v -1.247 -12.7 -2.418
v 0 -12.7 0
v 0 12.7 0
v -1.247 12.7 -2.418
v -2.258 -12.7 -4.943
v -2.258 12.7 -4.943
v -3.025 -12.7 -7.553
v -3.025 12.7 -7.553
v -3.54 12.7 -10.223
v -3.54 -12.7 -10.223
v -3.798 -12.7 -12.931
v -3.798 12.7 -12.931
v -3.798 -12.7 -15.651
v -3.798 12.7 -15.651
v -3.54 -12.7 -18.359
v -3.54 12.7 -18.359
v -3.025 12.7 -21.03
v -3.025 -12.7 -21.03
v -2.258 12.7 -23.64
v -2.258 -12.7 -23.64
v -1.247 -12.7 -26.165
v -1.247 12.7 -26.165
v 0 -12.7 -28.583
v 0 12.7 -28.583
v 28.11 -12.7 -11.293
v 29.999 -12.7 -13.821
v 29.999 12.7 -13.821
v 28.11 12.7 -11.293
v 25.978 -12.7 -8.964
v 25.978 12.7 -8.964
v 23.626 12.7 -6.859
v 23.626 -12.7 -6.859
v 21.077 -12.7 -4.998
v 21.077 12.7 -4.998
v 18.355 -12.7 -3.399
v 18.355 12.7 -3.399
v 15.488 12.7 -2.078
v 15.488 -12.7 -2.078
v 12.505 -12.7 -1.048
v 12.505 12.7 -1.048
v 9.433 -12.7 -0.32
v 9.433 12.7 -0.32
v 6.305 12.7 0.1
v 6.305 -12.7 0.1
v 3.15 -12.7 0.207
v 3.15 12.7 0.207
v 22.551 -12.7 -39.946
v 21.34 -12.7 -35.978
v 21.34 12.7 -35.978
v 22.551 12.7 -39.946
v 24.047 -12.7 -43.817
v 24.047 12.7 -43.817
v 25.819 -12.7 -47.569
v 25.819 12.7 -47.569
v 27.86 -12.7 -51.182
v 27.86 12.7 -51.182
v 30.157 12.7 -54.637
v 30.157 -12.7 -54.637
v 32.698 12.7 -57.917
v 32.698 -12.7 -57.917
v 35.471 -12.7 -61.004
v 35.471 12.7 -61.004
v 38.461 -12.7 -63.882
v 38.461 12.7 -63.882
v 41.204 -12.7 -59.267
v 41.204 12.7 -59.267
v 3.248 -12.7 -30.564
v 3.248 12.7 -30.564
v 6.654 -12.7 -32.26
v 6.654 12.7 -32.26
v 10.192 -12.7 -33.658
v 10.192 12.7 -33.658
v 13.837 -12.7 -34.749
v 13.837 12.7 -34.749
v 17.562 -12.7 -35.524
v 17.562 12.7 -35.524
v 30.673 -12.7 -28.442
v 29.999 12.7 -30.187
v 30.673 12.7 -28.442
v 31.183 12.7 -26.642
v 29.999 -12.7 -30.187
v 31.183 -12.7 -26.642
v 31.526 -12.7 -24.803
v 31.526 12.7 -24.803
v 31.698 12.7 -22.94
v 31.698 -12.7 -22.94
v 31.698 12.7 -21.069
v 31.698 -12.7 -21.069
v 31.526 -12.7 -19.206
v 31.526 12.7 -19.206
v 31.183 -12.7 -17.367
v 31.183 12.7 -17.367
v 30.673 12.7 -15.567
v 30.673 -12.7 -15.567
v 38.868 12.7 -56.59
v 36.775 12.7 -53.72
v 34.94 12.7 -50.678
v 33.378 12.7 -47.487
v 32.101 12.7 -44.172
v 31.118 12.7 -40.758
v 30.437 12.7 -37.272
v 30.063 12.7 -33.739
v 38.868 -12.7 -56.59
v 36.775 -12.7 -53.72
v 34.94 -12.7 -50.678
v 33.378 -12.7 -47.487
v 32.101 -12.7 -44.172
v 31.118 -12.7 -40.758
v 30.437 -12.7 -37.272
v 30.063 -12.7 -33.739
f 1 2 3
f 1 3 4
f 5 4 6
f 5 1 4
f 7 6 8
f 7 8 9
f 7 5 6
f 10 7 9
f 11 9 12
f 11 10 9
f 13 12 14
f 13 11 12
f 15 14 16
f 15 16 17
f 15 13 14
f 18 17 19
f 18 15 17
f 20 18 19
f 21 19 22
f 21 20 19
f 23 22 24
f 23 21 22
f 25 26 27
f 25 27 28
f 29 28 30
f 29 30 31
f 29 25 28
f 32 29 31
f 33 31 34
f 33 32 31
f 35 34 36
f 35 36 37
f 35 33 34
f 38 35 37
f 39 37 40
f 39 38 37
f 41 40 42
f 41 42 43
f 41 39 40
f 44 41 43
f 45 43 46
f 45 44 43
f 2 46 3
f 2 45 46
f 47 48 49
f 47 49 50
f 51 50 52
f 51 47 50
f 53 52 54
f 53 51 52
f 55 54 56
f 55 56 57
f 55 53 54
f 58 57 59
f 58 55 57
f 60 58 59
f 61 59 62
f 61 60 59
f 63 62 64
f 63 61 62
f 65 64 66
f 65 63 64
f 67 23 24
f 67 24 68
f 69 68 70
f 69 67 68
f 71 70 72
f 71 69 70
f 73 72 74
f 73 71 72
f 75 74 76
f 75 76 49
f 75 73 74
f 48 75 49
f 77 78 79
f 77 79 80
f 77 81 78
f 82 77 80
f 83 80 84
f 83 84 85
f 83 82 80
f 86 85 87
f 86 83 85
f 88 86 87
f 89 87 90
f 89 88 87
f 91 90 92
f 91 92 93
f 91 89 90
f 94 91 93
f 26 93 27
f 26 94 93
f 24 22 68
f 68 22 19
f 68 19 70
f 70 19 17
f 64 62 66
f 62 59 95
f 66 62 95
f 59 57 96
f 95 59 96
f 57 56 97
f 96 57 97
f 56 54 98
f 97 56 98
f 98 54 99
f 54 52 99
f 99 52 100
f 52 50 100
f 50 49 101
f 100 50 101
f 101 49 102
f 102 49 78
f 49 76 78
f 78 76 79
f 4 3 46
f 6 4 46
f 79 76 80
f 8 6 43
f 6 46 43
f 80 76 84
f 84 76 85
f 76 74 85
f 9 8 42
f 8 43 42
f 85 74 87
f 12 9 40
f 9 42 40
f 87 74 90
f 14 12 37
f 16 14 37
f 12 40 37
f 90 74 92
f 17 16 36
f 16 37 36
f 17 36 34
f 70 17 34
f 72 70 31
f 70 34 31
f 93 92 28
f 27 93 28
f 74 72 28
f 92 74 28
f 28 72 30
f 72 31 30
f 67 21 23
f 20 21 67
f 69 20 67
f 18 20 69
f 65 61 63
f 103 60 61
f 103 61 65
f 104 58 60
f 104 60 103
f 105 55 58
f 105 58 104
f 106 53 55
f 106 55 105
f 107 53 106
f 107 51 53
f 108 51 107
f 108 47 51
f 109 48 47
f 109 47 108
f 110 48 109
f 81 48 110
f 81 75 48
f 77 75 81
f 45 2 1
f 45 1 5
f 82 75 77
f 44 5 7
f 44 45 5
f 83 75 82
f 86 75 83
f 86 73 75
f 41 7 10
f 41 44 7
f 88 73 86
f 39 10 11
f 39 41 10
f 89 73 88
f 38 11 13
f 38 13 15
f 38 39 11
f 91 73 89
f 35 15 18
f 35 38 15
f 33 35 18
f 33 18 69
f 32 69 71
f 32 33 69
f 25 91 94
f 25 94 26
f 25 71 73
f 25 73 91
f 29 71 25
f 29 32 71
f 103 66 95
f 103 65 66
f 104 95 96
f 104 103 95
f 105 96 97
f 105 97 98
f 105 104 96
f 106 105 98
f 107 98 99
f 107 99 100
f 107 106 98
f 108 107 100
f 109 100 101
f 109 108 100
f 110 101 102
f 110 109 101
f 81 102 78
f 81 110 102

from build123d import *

# Parameters (mm, degrees)
F1_DEPTH = 12.7


with BuildPart() as f1:
    # F0 (on Front) → F1 (new body, symmetric)
    with BuildSketch(Plane.XZ):
        with BuildLine():
            ThreePointArc((29.999215, -30.187189), (31.719714, -22.004222), (29.999215, -13.821255))
            ThreePointArc((29.999215, -13.821255), (16.938376, -2.702505), (0, 0))
            ThreePointArc((0, 0), (-3.830529, -14.291319), (0, -28.582637))
            ThreePointArc((0, -28.582637), (10.192429, -33.65808), (21.339867, -35.977641))
            ThreePointArc((21.339867, -35.977641), (27.859584, -51.18178), (38.460912, -63.88156))
            Line((38.460912, -63.88156), (41.204112, -59.266559))
            ThreePointArc((41.204112, -59.266559), (32.703609, -45.843556), (29.999215, -30.187189))
        make_face()
    extrude(amount=F1_DEPTH, both=True)


solid = f1.part
